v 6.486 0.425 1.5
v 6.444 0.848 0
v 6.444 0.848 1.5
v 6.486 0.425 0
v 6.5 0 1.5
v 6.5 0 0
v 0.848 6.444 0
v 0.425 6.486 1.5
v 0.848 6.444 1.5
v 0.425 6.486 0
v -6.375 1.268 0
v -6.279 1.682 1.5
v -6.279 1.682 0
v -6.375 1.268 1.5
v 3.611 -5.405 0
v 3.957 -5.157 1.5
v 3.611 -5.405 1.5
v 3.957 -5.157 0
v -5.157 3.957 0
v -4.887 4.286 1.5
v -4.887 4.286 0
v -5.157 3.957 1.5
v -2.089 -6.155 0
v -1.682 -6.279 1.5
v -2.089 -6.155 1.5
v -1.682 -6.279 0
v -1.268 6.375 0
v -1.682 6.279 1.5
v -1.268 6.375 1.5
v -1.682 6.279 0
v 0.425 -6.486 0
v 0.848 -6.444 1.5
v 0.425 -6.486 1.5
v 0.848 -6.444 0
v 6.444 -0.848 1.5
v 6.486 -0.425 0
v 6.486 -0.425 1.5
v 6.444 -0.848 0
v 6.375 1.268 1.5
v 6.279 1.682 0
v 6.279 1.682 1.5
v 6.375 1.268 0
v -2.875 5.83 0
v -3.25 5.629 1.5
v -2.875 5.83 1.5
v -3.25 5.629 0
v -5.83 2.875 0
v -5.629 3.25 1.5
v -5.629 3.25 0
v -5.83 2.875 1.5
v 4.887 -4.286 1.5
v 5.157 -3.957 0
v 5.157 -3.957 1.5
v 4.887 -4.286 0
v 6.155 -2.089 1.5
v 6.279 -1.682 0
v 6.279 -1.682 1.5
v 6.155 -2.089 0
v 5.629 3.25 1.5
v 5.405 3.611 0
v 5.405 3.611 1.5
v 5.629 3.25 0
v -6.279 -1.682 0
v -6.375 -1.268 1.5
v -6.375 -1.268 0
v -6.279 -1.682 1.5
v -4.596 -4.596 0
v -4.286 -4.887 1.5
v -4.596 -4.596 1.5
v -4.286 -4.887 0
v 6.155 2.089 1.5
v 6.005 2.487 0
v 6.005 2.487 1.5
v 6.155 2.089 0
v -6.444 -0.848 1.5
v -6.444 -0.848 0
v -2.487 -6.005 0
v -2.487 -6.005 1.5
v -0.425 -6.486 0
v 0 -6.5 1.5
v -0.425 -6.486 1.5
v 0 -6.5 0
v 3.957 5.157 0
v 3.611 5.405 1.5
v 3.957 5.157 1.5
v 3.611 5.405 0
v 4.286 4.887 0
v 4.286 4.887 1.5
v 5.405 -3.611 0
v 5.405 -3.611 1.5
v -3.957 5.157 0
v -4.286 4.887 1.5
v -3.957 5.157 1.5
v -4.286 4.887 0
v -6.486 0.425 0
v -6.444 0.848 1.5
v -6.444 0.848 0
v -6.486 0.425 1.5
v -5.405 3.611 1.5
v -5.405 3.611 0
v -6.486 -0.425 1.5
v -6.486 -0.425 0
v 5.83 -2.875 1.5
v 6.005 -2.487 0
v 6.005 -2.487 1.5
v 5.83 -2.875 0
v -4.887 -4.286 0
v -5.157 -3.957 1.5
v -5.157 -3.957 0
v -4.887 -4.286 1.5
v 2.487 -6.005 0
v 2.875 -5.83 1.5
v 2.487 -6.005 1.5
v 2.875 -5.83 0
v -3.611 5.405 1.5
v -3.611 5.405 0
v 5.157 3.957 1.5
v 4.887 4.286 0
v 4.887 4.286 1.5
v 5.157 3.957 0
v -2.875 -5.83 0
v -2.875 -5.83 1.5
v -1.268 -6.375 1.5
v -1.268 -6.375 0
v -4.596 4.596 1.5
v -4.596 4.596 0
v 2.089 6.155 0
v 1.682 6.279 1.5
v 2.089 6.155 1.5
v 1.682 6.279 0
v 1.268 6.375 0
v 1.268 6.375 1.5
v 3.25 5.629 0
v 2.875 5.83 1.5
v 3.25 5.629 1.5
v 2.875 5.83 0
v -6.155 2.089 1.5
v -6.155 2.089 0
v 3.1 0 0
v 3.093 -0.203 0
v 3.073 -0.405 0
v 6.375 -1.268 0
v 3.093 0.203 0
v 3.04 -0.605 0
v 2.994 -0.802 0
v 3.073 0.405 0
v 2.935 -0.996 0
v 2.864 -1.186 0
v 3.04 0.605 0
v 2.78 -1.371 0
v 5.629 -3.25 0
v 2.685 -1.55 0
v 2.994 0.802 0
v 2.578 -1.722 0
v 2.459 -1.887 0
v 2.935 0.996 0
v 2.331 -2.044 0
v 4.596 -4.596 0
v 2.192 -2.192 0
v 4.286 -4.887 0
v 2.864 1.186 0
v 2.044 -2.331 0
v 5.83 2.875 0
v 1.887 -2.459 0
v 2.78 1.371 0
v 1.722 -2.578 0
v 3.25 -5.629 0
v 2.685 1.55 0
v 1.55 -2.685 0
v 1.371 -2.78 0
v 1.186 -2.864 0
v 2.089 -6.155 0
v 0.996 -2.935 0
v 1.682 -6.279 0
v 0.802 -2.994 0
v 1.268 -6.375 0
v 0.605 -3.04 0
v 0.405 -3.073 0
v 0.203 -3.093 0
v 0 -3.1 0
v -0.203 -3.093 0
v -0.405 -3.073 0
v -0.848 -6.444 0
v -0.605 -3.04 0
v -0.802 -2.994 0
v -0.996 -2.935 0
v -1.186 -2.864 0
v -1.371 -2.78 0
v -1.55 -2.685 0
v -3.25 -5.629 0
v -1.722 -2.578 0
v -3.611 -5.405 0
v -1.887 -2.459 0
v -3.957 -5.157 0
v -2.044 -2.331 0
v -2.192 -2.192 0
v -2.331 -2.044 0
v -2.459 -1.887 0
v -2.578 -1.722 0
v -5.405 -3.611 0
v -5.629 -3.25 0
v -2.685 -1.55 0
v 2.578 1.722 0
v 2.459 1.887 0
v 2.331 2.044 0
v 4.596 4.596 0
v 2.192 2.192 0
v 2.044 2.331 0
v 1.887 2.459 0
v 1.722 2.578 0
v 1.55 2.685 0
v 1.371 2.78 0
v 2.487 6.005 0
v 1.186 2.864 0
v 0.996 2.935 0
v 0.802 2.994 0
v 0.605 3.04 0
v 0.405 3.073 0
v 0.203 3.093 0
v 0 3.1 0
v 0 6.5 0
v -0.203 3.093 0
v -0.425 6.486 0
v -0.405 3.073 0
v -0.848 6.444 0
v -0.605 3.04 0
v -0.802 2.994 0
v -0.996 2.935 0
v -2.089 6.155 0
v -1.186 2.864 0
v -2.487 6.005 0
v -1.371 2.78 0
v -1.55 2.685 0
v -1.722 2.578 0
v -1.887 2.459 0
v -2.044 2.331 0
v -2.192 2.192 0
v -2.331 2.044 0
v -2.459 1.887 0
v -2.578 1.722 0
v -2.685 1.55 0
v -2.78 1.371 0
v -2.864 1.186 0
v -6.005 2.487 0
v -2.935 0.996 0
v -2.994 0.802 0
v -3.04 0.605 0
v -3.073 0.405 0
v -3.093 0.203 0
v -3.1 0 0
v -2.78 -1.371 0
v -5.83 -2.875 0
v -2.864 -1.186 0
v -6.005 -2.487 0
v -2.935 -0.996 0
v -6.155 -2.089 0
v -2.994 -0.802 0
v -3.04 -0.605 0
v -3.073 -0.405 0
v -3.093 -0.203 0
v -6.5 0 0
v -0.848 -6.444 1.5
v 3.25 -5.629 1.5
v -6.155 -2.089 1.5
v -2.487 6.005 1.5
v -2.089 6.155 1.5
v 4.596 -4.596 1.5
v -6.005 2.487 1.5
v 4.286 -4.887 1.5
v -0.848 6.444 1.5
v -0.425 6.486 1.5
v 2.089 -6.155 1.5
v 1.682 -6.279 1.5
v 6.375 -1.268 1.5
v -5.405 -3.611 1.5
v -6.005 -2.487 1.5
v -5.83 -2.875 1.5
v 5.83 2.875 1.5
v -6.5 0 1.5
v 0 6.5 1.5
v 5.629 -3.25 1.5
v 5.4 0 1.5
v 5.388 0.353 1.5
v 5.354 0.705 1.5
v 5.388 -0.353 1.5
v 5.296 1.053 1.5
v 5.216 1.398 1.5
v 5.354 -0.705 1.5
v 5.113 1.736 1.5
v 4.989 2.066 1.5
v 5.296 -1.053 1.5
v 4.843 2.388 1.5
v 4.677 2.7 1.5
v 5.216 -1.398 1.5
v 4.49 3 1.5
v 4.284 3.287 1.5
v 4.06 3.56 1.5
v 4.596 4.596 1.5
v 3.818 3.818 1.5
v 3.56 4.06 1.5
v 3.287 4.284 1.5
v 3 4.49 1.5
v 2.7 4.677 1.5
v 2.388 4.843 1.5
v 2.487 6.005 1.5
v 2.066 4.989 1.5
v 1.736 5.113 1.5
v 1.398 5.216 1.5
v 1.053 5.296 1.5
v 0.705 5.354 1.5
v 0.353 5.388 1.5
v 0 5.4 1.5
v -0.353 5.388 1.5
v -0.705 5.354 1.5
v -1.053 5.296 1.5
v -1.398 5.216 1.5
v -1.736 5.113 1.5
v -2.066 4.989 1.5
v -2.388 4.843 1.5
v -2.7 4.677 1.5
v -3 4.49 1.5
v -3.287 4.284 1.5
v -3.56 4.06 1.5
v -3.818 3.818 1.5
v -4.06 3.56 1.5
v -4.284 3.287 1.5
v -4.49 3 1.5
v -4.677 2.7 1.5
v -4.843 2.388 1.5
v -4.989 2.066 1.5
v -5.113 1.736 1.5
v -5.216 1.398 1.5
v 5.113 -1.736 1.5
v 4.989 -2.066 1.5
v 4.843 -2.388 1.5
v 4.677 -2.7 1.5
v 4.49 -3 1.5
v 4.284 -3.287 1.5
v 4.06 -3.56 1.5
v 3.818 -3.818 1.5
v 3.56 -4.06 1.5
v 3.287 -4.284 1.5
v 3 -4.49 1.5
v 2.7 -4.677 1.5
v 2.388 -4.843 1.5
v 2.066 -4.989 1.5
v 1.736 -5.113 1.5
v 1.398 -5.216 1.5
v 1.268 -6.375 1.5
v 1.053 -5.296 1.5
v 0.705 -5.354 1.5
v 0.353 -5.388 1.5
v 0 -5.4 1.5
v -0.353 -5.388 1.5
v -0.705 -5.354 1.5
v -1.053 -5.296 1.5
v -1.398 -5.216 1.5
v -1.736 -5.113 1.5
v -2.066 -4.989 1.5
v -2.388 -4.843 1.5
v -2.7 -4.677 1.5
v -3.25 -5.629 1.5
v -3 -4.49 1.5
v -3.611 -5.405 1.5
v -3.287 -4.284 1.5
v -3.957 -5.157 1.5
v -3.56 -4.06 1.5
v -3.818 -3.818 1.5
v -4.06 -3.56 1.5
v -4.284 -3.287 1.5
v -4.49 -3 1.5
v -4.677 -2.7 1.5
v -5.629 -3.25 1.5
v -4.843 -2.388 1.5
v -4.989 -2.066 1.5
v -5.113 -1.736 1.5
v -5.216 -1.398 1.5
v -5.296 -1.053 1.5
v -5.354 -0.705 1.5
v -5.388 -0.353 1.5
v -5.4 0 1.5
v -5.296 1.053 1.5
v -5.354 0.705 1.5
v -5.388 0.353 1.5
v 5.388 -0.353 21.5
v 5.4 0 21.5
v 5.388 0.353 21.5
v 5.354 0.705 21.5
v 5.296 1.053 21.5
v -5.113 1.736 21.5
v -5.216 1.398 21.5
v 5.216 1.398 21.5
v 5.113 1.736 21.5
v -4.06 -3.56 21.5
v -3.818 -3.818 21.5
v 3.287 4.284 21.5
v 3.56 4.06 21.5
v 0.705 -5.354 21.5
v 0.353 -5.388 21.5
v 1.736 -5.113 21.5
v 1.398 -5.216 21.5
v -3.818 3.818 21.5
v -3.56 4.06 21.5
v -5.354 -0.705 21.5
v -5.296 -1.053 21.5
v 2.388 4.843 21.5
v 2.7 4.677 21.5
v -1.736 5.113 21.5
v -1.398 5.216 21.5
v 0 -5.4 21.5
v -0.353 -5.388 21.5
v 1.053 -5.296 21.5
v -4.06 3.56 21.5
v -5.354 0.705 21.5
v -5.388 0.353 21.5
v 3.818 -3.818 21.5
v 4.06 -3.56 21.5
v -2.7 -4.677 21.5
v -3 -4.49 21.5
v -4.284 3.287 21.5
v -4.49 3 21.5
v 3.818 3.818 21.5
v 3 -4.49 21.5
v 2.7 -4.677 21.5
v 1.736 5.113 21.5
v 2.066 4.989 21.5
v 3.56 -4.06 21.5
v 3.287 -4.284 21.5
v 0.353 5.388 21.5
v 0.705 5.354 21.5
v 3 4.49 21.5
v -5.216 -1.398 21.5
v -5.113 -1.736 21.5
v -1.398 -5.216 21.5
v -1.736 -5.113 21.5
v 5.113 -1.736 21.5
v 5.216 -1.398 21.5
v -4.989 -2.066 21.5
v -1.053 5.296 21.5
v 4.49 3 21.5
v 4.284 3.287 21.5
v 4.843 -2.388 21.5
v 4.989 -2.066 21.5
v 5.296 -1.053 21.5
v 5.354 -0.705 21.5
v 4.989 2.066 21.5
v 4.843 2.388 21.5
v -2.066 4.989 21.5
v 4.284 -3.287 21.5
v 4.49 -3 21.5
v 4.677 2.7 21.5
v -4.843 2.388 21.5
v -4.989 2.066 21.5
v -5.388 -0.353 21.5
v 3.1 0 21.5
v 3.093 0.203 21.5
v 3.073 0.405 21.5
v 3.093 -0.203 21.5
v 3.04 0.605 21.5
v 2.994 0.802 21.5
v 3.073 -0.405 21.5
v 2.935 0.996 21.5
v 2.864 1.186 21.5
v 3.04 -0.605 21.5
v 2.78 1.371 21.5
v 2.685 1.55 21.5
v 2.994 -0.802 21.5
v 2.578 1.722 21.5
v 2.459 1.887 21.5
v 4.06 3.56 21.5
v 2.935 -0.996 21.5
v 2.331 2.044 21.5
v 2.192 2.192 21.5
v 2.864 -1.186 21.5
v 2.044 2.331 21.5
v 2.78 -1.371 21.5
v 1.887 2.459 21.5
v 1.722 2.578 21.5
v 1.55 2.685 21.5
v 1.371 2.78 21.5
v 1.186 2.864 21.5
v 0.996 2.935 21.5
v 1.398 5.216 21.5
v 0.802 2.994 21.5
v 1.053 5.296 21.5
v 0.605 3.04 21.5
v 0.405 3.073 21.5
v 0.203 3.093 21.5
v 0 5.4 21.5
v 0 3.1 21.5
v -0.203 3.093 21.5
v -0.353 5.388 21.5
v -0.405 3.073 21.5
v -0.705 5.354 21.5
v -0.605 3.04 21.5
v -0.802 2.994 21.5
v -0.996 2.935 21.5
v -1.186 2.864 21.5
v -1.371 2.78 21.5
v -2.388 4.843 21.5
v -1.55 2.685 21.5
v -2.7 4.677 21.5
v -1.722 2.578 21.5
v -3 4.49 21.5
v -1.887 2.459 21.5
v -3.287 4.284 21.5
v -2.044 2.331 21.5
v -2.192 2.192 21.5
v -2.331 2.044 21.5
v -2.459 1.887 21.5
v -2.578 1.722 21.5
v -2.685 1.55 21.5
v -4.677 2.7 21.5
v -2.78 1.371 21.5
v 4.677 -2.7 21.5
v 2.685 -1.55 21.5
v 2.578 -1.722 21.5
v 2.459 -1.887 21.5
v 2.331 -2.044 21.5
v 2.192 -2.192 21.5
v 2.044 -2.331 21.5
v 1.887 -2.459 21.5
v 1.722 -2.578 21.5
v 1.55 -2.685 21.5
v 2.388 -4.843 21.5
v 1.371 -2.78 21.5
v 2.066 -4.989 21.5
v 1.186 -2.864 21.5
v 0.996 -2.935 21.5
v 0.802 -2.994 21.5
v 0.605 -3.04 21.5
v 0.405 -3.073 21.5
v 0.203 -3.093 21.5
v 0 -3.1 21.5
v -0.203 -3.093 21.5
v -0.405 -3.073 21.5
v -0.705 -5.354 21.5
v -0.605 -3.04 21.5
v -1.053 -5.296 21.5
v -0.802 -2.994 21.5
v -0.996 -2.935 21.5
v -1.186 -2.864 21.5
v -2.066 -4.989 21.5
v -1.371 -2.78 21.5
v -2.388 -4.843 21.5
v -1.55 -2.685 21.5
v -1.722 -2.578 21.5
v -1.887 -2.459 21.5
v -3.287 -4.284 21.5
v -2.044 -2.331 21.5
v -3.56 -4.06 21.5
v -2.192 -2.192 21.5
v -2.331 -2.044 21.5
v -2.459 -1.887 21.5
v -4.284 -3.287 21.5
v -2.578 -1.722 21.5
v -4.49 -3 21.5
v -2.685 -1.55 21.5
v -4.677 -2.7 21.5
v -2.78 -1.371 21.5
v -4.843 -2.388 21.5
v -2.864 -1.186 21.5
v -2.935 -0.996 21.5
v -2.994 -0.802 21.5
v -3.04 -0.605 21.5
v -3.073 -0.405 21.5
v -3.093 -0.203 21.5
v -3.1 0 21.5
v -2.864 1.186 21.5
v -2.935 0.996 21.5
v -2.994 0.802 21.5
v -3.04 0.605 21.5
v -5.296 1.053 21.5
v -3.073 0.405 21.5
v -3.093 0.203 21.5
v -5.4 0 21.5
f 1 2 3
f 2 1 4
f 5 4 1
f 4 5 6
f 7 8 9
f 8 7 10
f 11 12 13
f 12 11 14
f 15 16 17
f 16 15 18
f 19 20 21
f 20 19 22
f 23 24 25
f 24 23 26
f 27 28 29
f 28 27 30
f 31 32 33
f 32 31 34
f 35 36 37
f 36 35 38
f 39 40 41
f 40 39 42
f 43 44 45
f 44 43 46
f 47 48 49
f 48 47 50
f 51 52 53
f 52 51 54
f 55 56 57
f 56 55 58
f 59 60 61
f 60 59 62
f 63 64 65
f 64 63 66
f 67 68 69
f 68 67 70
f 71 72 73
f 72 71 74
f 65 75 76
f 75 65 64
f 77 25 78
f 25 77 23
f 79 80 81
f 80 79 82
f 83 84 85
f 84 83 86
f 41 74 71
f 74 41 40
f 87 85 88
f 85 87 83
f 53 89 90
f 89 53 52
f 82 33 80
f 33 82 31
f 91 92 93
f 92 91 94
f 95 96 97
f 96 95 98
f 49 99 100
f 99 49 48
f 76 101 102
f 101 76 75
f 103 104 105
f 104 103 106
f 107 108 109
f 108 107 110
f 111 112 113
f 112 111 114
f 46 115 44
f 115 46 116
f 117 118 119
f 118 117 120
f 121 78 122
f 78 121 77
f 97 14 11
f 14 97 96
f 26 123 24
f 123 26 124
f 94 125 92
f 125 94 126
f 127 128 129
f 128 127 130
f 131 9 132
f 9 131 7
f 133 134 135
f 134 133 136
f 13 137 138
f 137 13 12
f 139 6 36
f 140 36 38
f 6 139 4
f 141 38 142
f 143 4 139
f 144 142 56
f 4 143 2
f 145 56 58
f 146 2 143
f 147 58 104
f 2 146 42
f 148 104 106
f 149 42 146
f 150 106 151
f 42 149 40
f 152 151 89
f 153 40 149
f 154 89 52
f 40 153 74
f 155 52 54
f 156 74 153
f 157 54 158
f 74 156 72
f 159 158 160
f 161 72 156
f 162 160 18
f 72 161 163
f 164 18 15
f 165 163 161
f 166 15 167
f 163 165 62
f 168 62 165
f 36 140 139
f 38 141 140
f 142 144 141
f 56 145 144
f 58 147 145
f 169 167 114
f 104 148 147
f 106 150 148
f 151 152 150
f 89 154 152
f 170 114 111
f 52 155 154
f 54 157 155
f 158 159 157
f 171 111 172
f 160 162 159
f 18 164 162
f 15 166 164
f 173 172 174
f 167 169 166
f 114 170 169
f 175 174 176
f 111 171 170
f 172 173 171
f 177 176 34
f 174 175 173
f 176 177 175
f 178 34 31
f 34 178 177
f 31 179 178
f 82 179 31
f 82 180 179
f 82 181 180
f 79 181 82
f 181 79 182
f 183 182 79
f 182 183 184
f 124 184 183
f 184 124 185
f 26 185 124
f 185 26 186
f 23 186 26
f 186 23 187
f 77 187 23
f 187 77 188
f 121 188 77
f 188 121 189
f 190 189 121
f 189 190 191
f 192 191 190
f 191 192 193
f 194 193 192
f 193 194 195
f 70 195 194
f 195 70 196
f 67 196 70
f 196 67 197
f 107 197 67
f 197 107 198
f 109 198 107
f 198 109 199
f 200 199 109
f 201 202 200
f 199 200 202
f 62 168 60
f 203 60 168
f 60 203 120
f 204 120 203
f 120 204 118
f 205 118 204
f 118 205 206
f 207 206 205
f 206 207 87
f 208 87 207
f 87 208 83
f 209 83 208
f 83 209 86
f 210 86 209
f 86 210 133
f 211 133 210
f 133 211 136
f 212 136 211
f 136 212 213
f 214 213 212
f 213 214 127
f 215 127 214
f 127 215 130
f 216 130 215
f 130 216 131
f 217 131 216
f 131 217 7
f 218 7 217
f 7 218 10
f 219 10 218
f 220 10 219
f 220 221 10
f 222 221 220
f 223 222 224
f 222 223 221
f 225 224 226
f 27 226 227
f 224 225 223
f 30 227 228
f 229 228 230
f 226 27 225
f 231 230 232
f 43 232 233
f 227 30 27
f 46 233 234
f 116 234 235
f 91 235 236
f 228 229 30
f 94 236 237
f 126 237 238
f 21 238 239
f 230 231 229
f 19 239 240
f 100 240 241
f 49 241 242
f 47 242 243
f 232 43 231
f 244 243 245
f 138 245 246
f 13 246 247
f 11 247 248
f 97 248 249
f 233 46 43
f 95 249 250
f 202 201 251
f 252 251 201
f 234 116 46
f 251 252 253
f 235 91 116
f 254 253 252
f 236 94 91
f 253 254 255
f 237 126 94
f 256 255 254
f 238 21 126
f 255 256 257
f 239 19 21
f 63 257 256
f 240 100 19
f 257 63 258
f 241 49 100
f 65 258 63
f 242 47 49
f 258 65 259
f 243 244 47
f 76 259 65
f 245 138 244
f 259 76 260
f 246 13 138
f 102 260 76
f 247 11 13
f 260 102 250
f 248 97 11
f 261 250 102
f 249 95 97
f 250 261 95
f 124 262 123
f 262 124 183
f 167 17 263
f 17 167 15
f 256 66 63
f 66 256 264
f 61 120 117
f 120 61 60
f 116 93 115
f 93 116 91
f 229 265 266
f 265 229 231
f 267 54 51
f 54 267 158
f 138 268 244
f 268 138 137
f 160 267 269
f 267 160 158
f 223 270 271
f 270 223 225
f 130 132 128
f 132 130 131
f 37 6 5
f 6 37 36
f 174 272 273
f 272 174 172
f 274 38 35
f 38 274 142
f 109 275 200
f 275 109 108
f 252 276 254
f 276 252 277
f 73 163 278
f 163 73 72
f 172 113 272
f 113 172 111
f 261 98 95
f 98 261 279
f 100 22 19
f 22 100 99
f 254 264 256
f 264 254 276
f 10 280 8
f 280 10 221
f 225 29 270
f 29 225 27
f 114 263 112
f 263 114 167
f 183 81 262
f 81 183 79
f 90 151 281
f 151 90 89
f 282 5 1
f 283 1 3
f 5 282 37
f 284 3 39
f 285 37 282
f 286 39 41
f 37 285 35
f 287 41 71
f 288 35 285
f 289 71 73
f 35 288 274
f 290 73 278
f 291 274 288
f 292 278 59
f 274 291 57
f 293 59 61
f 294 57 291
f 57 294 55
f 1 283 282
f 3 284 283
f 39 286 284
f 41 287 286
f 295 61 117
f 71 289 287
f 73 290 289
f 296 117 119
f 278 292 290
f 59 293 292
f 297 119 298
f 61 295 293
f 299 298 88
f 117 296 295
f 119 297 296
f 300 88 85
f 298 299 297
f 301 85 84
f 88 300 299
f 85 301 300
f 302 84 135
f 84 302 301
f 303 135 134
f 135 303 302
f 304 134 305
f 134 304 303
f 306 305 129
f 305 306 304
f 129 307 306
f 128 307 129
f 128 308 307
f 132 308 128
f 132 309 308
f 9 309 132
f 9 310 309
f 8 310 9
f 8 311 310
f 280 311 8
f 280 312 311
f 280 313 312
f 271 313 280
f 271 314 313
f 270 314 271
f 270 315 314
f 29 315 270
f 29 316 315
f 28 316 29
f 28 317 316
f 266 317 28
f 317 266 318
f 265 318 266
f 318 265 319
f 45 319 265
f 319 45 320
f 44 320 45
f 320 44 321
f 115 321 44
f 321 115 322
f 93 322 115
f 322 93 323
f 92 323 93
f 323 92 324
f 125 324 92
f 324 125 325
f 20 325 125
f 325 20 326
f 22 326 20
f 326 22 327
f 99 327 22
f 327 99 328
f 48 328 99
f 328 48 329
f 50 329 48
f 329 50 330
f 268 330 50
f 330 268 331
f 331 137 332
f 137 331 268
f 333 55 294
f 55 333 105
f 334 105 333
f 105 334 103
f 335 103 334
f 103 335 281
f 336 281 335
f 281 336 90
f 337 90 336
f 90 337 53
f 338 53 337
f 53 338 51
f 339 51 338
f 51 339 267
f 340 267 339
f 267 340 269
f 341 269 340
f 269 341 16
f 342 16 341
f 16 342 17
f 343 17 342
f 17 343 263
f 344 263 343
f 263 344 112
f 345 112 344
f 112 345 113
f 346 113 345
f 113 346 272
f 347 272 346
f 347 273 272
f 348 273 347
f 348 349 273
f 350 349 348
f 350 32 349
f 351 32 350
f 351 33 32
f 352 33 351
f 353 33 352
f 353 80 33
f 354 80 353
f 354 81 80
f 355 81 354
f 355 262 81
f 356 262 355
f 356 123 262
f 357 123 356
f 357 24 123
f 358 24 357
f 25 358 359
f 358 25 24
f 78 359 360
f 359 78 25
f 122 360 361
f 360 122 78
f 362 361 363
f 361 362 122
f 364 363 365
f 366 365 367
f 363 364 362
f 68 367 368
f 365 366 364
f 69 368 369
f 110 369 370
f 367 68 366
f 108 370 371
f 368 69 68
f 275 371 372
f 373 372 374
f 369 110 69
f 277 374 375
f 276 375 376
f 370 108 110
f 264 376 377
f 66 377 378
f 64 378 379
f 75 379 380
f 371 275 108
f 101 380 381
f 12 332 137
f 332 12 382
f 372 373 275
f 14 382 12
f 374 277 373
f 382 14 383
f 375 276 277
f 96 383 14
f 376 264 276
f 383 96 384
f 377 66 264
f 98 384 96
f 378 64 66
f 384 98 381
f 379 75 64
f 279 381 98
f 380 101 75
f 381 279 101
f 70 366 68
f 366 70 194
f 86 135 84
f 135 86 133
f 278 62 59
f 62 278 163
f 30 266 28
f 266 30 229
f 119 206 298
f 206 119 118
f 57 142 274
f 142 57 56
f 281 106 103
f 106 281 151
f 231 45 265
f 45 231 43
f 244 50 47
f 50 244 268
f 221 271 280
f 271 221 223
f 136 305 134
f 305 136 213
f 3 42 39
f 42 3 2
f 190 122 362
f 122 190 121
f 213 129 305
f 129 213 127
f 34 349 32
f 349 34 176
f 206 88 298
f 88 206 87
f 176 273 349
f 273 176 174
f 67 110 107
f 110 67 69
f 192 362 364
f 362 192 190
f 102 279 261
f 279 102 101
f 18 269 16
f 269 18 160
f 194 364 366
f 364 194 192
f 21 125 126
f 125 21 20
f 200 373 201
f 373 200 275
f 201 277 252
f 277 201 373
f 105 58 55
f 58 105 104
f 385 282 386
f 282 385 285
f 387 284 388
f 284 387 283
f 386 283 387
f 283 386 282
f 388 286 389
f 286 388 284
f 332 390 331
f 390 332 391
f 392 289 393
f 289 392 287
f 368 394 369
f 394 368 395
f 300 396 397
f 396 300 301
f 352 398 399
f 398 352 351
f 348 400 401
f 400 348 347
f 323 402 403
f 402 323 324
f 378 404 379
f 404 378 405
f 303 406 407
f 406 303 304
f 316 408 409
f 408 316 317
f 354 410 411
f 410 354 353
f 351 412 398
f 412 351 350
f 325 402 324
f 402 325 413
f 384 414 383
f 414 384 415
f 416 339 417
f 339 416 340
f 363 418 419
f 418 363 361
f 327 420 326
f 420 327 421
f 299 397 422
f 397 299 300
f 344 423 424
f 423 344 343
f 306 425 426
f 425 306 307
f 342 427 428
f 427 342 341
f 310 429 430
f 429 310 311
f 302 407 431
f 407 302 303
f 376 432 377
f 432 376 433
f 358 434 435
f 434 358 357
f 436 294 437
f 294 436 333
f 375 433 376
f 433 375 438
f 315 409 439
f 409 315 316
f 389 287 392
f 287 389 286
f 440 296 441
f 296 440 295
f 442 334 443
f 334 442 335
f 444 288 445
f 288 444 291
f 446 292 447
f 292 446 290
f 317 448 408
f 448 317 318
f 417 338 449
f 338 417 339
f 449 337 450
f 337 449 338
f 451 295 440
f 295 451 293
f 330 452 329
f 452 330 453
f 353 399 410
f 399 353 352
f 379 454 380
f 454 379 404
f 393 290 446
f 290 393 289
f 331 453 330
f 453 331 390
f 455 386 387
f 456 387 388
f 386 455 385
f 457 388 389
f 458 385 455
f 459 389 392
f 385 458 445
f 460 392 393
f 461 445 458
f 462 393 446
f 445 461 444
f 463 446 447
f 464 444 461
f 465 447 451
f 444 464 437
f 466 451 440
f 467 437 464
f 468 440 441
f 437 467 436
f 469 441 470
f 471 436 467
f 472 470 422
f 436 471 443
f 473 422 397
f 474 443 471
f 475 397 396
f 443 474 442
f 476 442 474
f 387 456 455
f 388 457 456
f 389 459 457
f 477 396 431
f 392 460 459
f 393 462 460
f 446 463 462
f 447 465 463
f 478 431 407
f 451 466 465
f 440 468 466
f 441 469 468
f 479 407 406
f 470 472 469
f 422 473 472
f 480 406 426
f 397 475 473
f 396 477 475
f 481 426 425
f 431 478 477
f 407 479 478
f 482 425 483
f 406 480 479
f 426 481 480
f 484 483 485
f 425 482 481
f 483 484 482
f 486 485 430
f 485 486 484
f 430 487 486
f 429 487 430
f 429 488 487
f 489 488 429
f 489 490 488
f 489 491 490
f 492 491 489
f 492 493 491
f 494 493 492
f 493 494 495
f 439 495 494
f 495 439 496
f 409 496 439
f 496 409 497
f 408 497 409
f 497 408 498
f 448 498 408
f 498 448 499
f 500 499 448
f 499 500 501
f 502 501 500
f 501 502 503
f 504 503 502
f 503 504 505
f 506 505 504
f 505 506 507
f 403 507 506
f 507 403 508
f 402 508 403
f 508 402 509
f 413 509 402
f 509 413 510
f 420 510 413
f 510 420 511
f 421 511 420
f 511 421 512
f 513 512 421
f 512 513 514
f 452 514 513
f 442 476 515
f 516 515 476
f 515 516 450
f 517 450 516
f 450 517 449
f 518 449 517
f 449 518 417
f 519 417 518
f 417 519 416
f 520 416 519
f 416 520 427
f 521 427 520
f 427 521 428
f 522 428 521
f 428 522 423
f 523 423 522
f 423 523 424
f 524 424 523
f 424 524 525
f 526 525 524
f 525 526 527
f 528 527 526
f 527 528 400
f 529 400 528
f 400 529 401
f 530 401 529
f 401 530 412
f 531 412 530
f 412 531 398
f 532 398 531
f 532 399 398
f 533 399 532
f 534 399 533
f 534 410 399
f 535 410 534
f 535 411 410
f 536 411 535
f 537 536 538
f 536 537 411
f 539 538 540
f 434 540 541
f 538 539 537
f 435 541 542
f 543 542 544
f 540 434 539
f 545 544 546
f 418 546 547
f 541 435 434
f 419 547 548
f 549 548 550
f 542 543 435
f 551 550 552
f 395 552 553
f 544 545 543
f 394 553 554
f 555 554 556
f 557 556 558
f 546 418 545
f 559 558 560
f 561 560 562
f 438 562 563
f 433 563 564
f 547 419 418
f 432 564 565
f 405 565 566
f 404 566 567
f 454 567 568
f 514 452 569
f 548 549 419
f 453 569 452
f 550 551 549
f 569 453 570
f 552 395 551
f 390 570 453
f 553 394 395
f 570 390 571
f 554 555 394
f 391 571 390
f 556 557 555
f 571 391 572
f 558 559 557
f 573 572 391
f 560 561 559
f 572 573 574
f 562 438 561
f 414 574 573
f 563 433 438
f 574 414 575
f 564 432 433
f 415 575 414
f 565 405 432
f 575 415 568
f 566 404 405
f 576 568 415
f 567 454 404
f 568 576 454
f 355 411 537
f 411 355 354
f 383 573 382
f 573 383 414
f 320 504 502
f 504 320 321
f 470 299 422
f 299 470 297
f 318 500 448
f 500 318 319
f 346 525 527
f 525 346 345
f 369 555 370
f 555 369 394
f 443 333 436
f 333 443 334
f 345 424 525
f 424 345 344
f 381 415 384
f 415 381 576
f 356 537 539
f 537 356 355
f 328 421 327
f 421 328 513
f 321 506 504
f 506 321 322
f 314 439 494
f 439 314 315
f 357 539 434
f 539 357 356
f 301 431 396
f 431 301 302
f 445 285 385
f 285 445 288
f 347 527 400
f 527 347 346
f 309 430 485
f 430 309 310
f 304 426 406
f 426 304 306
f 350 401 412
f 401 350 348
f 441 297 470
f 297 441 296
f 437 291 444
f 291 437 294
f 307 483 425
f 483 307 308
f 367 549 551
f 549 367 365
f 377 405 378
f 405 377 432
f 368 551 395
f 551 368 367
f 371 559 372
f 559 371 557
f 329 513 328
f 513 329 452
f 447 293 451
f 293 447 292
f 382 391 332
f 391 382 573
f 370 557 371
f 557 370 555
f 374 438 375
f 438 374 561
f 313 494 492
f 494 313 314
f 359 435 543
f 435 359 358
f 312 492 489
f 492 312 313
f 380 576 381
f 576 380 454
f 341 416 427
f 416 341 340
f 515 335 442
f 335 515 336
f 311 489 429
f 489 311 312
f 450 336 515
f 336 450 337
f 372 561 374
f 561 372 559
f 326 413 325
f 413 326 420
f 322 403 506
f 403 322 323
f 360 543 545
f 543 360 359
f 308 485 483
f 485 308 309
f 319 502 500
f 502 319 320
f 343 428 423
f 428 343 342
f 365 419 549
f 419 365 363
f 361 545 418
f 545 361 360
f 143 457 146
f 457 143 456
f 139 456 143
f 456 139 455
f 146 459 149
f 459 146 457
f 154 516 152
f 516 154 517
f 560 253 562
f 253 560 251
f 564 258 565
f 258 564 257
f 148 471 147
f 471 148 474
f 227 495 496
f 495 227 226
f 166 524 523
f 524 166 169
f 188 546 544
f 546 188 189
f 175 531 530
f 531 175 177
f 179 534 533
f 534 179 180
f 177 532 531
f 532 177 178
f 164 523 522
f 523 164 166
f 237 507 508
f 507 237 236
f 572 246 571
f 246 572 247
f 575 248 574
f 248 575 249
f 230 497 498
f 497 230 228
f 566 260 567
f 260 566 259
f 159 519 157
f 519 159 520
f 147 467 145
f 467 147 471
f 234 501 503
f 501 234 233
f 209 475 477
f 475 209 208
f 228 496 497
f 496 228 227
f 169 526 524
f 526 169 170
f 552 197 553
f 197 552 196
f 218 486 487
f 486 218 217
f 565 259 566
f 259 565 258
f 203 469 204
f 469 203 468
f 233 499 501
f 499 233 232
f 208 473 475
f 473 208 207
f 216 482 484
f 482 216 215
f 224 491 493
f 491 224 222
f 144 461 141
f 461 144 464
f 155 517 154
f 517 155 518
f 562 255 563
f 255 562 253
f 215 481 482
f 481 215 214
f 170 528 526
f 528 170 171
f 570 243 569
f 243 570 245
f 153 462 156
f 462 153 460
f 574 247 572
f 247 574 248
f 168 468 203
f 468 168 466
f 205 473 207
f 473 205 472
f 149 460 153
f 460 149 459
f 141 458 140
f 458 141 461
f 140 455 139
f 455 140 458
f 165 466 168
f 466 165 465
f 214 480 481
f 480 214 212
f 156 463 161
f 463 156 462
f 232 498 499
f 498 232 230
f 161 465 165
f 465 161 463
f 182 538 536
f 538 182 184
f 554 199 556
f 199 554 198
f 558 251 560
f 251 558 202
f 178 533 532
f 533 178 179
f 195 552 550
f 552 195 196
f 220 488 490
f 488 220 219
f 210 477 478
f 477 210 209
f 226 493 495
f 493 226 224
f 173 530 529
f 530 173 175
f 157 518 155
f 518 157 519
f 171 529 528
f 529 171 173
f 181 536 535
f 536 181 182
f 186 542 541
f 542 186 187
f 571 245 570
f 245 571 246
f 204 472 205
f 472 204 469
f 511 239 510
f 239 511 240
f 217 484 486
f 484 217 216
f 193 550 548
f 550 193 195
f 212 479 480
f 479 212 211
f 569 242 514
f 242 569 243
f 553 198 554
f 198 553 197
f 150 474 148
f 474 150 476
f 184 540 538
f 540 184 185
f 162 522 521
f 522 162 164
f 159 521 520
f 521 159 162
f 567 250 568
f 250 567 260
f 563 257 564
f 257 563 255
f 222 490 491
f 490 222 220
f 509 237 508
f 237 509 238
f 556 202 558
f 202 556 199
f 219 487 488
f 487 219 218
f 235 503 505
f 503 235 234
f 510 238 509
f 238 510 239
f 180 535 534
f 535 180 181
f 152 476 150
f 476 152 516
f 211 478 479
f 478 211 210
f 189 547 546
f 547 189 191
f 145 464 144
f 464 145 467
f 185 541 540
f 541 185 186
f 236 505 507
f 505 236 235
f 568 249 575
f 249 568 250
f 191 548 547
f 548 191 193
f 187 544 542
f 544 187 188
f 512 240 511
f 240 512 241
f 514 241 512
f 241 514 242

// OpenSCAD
// Adapter sleeve: 0.2 mL PCR tube in a 1.5 mL rack hole
// Print orientation: collar on the bed (z = 0), sleeve body builds upward

// ---------- Dimensions (mm) ----------
collar_d        = 13;    // collar outer diameter
collar_h        = 1.5;   // collar thickness (z = 0 to 1.5)
sleeve_od       = 10.8;  // sleeve body outer diameter
sleeve_top_z    = 21.5;  // top of sleeve body (sleeve height)
bore_d          = 6.2;   // through-bore diameter
eps             = 0.5;   // cutter overshoot past faces

$fn = 96;

// ---------- Model ----------
difference() {
    union() {
        // Collar
        cylinder(d = collar_d, h = collar_h);
        // Sleeve body (overlaps collar slightly for a clean union)
        translate([0, 0, collar_h - 0.01])
            cylinder(d = sleeve_od, h = sleeve_top_z - collar_h + 0.01);
    }
    // Full-height bore, open at both ends
    translate([0, 0, -eps])
        cylinder(d = bore_d, h = sleeve_top_z + 2 * eps);
}
